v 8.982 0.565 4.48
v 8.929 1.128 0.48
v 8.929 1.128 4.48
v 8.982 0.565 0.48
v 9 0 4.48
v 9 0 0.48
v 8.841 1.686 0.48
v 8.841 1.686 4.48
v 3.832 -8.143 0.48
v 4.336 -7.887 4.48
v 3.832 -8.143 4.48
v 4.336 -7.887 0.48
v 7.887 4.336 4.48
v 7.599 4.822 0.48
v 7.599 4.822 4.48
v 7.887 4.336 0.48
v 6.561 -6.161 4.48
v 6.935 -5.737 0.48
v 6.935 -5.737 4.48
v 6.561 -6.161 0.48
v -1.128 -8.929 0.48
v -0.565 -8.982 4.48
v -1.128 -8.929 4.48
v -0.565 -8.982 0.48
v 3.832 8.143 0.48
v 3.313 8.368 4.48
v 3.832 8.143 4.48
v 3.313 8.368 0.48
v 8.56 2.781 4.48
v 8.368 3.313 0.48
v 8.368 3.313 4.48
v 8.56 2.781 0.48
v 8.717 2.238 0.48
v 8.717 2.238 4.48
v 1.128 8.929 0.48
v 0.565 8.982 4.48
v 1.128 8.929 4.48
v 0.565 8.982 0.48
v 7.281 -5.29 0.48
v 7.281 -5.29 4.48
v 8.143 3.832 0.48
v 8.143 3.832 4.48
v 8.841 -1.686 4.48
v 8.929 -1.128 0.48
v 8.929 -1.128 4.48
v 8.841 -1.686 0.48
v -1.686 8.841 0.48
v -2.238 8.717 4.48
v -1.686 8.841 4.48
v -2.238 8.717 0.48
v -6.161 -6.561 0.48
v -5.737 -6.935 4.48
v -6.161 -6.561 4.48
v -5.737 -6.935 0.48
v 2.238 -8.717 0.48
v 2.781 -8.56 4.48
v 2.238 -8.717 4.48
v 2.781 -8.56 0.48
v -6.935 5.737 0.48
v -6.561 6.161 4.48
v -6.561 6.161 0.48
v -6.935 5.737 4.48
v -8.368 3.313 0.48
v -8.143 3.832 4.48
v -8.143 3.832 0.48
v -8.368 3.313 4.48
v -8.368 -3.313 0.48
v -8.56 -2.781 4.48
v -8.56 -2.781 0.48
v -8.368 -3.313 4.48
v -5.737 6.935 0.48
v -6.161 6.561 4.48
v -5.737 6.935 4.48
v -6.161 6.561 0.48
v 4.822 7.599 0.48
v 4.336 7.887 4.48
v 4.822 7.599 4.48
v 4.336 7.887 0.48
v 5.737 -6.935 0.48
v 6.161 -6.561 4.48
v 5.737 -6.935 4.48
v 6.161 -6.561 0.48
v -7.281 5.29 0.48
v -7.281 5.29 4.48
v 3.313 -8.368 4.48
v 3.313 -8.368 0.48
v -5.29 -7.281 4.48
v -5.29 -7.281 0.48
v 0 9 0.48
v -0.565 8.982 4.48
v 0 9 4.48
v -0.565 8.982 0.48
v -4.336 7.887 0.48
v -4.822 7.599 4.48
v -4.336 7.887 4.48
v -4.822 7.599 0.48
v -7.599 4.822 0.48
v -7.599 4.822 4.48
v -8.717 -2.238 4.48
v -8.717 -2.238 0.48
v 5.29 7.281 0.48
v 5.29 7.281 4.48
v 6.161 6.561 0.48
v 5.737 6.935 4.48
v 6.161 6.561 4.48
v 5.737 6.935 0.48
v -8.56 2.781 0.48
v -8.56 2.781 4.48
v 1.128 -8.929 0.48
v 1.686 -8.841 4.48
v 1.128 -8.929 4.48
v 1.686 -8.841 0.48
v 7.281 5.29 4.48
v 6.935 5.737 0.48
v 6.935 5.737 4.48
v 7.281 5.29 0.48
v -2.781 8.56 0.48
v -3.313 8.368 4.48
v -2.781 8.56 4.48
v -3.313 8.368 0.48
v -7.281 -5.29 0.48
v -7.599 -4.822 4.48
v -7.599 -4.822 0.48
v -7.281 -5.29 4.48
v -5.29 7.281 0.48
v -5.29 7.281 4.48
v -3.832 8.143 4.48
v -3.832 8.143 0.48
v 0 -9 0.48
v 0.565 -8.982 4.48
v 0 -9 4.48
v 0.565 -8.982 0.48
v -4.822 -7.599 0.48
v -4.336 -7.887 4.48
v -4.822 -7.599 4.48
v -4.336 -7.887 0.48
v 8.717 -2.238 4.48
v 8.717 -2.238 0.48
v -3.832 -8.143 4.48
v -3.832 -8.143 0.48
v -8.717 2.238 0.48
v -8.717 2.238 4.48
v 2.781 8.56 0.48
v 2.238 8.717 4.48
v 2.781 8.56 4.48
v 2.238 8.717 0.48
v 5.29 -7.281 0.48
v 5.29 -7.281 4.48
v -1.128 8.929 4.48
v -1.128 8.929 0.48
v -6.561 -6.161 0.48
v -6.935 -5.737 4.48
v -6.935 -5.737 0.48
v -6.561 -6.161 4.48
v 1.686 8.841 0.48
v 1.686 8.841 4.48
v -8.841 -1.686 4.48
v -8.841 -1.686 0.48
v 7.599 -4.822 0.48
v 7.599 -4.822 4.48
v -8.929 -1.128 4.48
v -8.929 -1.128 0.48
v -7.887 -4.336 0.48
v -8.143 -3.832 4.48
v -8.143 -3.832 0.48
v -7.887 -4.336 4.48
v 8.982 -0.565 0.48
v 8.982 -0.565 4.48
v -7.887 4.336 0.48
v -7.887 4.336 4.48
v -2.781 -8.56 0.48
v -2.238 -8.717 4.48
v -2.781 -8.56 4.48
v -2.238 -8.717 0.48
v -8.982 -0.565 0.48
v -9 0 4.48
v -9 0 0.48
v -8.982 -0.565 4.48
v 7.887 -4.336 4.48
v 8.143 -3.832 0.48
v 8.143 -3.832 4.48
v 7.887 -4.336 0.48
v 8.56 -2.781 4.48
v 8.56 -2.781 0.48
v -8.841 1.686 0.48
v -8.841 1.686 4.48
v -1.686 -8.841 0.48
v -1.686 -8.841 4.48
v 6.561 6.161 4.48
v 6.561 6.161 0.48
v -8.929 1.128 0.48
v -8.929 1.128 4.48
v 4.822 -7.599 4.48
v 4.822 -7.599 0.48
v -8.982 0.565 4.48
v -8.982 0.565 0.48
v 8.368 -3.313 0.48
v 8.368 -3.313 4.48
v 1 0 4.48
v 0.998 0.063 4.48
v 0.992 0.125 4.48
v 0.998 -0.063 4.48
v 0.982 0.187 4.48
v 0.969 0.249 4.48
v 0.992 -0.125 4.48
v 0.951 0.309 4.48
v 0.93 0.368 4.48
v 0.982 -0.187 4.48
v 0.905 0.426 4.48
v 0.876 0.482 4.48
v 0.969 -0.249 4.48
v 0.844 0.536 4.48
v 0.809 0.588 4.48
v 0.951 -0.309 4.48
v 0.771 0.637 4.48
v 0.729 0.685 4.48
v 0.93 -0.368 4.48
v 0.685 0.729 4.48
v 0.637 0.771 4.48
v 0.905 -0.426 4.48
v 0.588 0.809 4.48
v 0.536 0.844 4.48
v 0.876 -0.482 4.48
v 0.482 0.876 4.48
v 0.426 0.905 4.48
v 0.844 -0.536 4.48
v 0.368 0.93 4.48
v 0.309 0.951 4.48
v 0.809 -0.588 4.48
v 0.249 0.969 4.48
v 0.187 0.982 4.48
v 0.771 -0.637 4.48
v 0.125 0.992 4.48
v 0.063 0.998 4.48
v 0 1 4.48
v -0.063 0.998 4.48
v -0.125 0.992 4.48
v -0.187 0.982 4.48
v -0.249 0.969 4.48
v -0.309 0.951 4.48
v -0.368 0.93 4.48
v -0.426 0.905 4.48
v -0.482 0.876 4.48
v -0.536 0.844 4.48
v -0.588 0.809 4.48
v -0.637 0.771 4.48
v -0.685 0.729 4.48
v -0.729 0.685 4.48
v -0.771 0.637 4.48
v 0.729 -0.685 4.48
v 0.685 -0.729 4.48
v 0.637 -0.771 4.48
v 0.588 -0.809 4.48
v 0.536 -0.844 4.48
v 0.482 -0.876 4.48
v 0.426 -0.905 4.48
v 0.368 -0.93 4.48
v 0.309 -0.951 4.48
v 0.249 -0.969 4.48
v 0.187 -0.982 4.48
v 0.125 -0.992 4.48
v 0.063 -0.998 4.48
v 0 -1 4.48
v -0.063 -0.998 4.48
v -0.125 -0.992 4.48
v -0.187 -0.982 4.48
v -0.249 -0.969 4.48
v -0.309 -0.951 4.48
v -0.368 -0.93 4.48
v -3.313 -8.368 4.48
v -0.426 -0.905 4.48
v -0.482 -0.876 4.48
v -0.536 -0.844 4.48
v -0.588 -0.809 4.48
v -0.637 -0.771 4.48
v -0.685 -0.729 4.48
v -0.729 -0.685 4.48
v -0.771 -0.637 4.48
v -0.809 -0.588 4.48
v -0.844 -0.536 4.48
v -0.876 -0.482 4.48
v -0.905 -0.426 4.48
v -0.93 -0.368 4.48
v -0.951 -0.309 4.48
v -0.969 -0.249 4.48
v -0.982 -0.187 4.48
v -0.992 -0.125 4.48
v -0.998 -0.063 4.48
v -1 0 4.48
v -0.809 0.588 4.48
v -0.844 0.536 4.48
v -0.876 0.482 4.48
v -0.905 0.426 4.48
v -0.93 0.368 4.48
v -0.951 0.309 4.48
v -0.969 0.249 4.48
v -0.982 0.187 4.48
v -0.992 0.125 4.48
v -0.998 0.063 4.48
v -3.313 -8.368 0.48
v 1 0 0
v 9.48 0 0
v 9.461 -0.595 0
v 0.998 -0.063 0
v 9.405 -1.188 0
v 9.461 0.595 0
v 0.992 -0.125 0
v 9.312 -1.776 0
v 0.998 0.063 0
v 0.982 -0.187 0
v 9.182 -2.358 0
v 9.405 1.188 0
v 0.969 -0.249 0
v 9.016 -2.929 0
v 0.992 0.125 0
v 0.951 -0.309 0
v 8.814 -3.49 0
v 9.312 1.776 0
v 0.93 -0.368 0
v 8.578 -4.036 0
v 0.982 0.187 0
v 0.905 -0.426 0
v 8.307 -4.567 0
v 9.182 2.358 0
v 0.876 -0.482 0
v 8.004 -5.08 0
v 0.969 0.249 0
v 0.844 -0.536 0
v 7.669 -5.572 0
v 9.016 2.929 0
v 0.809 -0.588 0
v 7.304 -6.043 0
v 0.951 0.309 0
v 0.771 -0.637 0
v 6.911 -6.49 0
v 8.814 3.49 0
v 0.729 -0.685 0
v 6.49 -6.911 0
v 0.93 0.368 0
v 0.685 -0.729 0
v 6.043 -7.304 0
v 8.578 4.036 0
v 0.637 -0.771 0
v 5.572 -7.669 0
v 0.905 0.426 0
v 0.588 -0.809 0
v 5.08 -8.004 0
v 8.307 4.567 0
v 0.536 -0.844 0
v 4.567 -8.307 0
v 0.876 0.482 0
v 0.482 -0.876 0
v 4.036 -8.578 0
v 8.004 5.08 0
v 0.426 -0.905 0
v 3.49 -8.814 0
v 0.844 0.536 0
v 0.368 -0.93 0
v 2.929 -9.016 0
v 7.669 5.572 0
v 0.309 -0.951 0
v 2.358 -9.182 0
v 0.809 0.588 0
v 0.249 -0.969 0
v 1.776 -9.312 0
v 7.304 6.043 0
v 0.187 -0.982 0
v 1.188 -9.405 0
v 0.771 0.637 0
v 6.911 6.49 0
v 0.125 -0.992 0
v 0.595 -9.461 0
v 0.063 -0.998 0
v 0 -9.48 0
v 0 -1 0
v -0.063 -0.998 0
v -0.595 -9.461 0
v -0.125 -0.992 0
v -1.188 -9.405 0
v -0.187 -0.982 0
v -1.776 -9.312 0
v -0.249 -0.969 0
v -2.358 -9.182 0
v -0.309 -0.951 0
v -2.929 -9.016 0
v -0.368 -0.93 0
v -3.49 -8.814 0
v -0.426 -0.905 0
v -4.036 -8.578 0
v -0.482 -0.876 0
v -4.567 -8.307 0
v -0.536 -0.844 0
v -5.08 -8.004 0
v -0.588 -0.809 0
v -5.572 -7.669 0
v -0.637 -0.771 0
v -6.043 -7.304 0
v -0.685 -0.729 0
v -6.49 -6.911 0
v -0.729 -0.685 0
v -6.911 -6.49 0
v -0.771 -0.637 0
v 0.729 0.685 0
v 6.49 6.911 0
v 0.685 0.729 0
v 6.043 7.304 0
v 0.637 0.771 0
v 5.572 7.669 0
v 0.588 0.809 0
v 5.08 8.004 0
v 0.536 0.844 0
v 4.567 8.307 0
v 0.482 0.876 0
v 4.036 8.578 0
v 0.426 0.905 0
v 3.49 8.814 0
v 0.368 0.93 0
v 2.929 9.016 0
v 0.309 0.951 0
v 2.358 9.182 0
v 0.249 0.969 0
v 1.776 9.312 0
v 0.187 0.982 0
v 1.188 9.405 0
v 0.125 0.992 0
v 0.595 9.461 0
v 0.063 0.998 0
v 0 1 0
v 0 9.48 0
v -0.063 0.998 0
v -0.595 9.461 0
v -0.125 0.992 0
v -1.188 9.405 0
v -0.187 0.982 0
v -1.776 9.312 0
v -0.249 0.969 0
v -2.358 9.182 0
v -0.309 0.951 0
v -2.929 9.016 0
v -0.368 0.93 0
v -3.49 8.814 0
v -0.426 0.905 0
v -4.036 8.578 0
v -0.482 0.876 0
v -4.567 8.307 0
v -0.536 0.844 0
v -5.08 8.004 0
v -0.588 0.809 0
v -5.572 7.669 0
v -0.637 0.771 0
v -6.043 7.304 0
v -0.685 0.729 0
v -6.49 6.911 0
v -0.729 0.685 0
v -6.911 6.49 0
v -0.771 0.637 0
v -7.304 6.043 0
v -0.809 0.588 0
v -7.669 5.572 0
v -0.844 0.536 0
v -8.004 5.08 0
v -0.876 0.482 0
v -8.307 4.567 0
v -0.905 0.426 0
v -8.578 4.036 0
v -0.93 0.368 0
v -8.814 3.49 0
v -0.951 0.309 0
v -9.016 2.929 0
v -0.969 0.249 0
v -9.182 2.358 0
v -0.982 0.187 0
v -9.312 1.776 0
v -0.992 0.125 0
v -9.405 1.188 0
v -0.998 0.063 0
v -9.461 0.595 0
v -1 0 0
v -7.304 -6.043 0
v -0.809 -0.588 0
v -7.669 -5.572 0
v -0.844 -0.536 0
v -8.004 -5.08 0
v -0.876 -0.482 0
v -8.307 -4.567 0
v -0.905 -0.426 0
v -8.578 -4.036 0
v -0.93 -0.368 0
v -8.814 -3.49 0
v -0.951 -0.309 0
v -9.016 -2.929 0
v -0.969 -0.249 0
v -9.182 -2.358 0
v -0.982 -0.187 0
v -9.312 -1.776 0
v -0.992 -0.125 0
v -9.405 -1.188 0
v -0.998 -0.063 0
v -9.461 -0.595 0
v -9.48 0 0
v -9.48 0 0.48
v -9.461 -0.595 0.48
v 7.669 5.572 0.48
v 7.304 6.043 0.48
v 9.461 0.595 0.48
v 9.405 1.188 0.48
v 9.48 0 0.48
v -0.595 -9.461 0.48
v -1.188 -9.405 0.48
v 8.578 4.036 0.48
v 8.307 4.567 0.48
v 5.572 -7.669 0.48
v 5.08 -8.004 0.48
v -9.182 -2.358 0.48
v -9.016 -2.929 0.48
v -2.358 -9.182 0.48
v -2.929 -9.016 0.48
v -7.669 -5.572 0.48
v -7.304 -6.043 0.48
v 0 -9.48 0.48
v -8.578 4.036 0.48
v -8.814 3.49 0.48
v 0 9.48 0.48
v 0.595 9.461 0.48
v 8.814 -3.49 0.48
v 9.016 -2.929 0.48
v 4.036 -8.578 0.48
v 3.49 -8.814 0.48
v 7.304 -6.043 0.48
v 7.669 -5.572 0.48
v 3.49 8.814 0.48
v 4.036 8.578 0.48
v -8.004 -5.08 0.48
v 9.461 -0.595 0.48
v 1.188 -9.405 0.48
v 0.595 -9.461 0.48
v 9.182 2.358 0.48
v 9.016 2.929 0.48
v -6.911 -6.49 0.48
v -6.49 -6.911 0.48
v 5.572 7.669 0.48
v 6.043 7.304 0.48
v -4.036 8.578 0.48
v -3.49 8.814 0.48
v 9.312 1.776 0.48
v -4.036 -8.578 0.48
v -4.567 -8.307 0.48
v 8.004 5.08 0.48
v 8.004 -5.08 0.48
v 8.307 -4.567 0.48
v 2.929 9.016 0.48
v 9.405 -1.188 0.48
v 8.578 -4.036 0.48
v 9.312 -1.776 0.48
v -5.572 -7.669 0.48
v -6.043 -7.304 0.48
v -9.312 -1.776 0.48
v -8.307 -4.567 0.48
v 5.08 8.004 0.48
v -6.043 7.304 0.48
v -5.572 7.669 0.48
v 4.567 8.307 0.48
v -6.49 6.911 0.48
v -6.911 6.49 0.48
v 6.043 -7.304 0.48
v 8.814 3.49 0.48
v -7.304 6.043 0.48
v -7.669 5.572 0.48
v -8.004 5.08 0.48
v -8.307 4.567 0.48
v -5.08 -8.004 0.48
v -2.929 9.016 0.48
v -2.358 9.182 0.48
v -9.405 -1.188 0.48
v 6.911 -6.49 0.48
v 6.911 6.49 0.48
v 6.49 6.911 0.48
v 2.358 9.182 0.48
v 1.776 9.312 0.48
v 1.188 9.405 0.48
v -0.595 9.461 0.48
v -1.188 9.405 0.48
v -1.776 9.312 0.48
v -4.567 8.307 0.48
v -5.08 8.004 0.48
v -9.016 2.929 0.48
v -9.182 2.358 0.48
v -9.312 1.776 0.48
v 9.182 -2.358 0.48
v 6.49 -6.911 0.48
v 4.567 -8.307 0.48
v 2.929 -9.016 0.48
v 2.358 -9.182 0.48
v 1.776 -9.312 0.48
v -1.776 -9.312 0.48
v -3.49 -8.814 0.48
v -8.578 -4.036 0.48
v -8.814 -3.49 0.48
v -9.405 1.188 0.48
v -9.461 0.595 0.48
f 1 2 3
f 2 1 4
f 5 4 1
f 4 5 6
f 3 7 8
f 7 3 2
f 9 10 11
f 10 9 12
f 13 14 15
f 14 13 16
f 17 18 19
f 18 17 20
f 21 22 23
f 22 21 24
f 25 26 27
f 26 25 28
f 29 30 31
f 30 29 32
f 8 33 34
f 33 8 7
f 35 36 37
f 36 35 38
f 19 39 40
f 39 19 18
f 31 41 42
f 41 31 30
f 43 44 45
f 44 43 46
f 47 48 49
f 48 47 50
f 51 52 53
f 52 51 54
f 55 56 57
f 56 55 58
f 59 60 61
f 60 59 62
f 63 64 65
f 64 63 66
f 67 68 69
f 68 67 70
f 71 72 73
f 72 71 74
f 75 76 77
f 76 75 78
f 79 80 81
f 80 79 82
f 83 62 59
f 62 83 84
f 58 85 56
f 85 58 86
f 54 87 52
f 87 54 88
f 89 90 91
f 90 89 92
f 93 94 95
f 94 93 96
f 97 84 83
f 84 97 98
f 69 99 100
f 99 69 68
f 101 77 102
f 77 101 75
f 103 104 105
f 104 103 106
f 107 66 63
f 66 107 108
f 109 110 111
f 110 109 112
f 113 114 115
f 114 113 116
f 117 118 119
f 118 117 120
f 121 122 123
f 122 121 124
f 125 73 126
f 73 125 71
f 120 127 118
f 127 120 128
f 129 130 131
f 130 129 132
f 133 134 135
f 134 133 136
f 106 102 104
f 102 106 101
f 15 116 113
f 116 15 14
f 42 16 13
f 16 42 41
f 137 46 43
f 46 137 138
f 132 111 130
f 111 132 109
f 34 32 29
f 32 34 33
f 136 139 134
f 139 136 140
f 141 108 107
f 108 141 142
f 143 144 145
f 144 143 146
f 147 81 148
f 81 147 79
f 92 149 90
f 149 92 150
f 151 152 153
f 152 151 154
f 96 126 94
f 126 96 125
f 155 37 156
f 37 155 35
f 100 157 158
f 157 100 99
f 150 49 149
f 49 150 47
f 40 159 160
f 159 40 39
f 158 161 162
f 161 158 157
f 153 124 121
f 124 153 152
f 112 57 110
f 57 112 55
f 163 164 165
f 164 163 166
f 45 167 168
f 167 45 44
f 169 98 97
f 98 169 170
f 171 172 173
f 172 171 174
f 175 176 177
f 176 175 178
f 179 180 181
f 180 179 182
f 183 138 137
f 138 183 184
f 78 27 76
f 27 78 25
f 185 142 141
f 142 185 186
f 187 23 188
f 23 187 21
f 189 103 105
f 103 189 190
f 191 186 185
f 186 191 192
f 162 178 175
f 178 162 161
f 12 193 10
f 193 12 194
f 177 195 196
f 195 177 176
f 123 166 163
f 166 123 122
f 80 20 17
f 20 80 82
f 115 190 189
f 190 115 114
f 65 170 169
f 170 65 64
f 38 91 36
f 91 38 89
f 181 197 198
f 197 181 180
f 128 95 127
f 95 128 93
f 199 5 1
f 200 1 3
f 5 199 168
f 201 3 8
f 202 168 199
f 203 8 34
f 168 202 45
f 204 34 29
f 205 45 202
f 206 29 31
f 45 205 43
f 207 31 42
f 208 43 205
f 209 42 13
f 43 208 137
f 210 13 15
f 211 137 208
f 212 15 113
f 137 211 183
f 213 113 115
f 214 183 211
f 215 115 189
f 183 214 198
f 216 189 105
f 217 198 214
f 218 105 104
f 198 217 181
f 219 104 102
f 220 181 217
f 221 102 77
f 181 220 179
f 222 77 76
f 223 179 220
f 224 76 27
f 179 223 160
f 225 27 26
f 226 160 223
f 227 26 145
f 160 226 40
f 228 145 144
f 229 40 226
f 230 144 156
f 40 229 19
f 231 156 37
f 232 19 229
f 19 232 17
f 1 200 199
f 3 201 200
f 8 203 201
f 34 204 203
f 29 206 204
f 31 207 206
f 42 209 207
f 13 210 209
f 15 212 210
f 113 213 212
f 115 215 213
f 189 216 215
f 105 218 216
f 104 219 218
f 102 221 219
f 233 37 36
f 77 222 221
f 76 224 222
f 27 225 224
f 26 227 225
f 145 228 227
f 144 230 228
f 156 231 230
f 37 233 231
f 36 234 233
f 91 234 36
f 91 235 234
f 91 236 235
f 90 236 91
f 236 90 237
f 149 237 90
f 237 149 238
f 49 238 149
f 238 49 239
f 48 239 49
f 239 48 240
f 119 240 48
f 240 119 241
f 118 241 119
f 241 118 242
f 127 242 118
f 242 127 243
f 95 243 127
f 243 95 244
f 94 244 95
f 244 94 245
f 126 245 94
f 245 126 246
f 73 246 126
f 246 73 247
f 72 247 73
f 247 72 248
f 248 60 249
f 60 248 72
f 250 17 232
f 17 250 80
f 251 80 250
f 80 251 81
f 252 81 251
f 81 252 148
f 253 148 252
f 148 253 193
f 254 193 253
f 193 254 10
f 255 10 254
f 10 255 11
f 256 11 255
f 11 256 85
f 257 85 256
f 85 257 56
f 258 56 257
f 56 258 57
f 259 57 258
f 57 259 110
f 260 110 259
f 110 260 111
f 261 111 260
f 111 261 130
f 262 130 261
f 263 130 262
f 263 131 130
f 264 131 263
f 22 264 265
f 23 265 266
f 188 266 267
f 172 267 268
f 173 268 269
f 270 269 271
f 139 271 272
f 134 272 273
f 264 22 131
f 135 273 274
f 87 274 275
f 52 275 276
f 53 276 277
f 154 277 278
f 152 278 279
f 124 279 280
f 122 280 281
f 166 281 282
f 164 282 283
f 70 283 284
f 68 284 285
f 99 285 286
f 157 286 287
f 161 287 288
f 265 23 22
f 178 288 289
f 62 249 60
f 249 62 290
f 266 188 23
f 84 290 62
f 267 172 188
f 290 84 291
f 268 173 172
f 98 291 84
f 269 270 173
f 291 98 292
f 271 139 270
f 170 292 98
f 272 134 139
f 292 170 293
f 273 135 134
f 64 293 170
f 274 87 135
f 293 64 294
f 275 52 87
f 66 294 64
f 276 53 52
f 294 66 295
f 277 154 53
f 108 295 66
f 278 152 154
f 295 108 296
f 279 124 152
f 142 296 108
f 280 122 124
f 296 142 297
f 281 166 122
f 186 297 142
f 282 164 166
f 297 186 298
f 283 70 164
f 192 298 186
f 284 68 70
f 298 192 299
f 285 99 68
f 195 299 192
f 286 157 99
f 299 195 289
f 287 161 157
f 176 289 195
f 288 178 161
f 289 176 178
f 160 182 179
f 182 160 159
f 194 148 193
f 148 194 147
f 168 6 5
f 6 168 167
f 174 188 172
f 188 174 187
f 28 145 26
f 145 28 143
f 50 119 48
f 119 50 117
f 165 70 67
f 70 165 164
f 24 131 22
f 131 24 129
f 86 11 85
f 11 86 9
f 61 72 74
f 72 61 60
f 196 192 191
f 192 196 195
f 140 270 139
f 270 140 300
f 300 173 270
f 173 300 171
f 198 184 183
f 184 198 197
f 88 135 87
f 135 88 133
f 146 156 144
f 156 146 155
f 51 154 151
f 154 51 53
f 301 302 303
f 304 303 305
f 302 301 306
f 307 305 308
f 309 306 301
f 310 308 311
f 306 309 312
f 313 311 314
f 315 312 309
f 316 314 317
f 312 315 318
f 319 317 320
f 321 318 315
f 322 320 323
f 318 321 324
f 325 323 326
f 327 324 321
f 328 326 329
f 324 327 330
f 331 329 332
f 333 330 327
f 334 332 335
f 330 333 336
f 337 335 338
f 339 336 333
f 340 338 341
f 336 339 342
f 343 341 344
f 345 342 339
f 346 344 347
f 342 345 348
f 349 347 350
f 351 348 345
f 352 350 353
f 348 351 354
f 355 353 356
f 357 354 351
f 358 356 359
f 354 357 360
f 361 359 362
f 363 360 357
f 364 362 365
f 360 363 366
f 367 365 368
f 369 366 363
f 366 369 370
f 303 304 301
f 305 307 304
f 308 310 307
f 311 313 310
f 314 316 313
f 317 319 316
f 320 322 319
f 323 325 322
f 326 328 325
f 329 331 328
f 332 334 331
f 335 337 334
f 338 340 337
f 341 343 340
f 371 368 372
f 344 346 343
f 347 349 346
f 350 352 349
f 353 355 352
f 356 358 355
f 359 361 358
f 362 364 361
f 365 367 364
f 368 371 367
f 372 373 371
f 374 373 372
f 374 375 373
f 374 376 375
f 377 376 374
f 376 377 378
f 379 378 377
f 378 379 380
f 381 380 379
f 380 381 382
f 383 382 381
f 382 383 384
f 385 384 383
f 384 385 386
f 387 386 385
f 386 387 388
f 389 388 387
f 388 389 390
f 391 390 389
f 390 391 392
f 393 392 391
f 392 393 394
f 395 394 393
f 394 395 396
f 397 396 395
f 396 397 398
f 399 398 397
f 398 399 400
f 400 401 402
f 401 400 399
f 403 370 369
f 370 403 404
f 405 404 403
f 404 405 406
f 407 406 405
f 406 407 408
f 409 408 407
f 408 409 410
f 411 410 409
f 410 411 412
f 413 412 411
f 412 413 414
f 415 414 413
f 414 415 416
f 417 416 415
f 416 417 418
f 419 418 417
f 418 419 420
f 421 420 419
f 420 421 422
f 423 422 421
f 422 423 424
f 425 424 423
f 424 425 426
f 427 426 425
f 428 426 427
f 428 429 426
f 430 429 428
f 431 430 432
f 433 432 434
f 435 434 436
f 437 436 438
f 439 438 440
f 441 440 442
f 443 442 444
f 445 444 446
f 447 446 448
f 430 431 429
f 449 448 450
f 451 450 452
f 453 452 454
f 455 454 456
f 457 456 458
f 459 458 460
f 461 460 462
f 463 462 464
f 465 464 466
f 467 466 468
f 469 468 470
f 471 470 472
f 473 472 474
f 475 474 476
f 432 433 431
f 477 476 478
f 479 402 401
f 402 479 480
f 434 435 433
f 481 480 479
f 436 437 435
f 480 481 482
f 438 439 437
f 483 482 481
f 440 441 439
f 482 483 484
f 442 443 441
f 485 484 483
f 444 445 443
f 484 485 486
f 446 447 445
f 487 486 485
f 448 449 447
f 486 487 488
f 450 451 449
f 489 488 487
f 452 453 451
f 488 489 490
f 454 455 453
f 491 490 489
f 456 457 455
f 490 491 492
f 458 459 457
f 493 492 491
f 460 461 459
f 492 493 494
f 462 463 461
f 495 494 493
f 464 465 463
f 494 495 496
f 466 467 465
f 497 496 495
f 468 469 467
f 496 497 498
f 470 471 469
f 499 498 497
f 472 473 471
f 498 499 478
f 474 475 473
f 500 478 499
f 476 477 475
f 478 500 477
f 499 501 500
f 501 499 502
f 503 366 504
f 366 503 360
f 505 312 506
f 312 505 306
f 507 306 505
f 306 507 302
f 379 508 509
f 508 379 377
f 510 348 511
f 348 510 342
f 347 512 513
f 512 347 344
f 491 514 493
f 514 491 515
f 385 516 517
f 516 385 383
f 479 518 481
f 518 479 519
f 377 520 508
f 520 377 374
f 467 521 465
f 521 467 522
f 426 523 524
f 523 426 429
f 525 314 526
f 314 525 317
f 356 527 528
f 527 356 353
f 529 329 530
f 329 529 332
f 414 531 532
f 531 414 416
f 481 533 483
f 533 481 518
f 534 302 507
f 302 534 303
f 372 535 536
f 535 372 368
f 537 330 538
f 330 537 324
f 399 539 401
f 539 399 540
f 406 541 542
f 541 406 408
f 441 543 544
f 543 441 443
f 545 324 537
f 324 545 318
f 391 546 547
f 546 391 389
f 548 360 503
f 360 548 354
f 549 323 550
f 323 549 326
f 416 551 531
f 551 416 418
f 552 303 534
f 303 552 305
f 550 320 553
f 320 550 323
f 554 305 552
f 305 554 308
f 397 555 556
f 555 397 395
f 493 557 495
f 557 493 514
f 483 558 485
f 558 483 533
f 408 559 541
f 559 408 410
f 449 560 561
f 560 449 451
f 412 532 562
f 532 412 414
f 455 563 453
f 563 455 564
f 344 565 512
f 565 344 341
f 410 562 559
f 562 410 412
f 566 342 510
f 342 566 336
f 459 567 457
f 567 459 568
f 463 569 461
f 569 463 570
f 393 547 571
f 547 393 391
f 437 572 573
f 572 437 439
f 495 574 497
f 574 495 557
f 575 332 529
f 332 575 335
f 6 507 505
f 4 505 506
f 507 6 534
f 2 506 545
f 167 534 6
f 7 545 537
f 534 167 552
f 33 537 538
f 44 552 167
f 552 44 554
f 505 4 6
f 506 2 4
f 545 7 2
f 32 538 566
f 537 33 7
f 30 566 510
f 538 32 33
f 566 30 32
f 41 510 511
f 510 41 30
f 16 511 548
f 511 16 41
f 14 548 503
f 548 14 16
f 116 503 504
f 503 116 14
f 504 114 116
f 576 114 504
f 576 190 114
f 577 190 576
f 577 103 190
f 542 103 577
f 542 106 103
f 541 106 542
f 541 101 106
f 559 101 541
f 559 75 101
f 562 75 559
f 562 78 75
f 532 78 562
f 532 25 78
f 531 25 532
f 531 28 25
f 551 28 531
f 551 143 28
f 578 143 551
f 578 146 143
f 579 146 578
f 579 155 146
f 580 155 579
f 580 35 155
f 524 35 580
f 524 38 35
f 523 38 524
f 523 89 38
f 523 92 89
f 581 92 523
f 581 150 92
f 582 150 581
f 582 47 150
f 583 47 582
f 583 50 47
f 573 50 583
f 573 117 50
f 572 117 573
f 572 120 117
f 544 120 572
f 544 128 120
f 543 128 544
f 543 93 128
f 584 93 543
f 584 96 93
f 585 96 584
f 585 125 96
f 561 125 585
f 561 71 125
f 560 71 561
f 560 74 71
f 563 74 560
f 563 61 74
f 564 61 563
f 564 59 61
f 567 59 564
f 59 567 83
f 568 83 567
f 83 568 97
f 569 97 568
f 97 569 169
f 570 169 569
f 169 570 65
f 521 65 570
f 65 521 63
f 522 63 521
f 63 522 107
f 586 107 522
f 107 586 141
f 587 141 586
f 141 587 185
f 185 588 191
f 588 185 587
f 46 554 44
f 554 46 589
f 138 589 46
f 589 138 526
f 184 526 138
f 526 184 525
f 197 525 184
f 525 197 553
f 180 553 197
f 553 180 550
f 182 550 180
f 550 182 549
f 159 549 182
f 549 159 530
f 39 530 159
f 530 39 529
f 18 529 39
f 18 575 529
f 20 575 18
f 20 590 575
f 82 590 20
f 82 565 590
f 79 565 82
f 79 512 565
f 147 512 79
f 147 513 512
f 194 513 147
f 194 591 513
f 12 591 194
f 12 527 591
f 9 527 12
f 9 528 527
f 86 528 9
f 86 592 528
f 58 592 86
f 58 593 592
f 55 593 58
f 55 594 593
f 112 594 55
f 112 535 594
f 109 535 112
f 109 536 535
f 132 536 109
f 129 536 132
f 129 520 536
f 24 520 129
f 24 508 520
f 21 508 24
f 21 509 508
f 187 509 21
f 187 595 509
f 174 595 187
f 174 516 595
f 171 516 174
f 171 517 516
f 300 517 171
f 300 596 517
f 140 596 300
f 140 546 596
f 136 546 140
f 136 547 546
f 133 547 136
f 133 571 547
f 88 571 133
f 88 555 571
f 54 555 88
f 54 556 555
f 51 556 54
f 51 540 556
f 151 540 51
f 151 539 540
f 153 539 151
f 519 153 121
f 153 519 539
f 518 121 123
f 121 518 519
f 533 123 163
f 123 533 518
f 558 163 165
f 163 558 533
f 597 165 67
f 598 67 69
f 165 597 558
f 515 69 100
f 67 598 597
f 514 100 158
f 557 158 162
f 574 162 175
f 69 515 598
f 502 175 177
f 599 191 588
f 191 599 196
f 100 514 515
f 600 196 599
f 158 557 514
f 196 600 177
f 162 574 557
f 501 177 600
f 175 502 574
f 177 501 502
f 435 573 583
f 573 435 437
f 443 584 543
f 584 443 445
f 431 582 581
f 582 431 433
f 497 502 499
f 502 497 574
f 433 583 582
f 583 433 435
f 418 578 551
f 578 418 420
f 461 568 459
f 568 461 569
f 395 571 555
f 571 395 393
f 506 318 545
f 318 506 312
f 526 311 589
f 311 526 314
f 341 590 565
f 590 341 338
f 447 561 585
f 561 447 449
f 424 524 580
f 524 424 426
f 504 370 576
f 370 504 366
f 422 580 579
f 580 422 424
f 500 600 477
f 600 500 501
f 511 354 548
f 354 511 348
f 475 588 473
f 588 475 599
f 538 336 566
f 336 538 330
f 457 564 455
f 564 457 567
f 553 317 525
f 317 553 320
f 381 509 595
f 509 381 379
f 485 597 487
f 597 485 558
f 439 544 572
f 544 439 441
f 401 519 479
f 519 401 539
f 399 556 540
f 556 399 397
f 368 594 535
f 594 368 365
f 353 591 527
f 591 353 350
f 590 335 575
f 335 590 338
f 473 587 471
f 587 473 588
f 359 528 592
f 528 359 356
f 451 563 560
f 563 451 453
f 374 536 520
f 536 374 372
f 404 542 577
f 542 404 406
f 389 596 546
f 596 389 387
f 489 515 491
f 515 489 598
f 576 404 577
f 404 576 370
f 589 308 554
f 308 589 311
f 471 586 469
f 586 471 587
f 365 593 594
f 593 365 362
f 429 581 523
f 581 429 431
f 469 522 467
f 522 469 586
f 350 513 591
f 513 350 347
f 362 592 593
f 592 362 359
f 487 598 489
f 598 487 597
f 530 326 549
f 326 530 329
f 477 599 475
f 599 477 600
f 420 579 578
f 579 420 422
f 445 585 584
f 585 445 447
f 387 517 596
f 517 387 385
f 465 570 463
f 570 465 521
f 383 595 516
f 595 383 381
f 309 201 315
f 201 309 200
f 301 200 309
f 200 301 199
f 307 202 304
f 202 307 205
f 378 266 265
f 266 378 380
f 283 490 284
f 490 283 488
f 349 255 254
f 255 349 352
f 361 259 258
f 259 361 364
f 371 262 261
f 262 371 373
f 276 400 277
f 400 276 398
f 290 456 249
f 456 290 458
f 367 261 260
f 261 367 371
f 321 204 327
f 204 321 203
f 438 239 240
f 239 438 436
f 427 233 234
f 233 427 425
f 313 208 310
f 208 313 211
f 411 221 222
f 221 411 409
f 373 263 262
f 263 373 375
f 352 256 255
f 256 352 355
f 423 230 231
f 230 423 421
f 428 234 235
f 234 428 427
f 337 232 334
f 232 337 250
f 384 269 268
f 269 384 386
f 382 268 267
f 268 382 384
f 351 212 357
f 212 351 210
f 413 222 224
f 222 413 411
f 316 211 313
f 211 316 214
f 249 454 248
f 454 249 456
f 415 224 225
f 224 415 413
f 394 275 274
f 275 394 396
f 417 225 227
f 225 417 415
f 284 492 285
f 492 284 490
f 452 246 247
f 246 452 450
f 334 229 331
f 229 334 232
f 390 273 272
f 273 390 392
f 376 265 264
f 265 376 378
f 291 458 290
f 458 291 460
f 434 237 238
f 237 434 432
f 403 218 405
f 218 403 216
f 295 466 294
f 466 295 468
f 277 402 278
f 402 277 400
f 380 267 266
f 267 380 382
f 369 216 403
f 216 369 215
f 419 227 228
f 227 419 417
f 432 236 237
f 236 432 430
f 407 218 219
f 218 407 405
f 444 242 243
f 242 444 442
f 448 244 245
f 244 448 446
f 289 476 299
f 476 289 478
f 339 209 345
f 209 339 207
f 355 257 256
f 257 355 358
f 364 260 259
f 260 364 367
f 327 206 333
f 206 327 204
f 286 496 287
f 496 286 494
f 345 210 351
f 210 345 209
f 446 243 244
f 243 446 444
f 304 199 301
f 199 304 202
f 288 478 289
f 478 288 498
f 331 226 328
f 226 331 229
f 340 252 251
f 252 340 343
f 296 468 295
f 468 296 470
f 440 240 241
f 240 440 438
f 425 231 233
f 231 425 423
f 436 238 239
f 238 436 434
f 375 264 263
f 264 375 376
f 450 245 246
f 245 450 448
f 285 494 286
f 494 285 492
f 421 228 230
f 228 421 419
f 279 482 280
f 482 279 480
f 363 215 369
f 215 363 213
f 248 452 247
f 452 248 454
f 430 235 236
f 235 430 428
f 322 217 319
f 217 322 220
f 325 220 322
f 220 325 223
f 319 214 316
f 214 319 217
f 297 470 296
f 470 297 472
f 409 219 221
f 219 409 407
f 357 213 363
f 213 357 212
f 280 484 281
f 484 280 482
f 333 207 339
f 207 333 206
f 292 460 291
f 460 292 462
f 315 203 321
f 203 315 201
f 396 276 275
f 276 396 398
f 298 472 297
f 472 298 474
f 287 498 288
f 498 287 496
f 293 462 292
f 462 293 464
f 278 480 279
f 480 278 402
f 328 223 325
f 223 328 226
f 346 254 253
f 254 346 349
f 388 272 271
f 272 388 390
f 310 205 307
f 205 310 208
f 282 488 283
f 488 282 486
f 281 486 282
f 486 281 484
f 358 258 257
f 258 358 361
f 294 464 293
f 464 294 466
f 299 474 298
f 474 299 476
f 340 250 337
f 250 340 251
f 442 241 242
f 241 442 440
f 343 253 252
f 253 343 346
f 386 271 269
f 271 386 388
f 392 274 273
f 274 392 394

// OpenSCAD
diameter = 18;   // CHANGE THIS
radius = diameter / 2;
thickness = 0.48;
cap_height = 4;
hole_radius = 1; // CHANGE THIS

difference() {
  union() {
    cylinder($fn=100, cap_height+thickness, radius, radius);
    cylinder($fn=100, thickness, radius+thickness, radius+thickness);
  }
  translate([0,0,-1])
    cylinder($fn=100, cap_height+thickness+2, hole_radius, hole_radius);
}
